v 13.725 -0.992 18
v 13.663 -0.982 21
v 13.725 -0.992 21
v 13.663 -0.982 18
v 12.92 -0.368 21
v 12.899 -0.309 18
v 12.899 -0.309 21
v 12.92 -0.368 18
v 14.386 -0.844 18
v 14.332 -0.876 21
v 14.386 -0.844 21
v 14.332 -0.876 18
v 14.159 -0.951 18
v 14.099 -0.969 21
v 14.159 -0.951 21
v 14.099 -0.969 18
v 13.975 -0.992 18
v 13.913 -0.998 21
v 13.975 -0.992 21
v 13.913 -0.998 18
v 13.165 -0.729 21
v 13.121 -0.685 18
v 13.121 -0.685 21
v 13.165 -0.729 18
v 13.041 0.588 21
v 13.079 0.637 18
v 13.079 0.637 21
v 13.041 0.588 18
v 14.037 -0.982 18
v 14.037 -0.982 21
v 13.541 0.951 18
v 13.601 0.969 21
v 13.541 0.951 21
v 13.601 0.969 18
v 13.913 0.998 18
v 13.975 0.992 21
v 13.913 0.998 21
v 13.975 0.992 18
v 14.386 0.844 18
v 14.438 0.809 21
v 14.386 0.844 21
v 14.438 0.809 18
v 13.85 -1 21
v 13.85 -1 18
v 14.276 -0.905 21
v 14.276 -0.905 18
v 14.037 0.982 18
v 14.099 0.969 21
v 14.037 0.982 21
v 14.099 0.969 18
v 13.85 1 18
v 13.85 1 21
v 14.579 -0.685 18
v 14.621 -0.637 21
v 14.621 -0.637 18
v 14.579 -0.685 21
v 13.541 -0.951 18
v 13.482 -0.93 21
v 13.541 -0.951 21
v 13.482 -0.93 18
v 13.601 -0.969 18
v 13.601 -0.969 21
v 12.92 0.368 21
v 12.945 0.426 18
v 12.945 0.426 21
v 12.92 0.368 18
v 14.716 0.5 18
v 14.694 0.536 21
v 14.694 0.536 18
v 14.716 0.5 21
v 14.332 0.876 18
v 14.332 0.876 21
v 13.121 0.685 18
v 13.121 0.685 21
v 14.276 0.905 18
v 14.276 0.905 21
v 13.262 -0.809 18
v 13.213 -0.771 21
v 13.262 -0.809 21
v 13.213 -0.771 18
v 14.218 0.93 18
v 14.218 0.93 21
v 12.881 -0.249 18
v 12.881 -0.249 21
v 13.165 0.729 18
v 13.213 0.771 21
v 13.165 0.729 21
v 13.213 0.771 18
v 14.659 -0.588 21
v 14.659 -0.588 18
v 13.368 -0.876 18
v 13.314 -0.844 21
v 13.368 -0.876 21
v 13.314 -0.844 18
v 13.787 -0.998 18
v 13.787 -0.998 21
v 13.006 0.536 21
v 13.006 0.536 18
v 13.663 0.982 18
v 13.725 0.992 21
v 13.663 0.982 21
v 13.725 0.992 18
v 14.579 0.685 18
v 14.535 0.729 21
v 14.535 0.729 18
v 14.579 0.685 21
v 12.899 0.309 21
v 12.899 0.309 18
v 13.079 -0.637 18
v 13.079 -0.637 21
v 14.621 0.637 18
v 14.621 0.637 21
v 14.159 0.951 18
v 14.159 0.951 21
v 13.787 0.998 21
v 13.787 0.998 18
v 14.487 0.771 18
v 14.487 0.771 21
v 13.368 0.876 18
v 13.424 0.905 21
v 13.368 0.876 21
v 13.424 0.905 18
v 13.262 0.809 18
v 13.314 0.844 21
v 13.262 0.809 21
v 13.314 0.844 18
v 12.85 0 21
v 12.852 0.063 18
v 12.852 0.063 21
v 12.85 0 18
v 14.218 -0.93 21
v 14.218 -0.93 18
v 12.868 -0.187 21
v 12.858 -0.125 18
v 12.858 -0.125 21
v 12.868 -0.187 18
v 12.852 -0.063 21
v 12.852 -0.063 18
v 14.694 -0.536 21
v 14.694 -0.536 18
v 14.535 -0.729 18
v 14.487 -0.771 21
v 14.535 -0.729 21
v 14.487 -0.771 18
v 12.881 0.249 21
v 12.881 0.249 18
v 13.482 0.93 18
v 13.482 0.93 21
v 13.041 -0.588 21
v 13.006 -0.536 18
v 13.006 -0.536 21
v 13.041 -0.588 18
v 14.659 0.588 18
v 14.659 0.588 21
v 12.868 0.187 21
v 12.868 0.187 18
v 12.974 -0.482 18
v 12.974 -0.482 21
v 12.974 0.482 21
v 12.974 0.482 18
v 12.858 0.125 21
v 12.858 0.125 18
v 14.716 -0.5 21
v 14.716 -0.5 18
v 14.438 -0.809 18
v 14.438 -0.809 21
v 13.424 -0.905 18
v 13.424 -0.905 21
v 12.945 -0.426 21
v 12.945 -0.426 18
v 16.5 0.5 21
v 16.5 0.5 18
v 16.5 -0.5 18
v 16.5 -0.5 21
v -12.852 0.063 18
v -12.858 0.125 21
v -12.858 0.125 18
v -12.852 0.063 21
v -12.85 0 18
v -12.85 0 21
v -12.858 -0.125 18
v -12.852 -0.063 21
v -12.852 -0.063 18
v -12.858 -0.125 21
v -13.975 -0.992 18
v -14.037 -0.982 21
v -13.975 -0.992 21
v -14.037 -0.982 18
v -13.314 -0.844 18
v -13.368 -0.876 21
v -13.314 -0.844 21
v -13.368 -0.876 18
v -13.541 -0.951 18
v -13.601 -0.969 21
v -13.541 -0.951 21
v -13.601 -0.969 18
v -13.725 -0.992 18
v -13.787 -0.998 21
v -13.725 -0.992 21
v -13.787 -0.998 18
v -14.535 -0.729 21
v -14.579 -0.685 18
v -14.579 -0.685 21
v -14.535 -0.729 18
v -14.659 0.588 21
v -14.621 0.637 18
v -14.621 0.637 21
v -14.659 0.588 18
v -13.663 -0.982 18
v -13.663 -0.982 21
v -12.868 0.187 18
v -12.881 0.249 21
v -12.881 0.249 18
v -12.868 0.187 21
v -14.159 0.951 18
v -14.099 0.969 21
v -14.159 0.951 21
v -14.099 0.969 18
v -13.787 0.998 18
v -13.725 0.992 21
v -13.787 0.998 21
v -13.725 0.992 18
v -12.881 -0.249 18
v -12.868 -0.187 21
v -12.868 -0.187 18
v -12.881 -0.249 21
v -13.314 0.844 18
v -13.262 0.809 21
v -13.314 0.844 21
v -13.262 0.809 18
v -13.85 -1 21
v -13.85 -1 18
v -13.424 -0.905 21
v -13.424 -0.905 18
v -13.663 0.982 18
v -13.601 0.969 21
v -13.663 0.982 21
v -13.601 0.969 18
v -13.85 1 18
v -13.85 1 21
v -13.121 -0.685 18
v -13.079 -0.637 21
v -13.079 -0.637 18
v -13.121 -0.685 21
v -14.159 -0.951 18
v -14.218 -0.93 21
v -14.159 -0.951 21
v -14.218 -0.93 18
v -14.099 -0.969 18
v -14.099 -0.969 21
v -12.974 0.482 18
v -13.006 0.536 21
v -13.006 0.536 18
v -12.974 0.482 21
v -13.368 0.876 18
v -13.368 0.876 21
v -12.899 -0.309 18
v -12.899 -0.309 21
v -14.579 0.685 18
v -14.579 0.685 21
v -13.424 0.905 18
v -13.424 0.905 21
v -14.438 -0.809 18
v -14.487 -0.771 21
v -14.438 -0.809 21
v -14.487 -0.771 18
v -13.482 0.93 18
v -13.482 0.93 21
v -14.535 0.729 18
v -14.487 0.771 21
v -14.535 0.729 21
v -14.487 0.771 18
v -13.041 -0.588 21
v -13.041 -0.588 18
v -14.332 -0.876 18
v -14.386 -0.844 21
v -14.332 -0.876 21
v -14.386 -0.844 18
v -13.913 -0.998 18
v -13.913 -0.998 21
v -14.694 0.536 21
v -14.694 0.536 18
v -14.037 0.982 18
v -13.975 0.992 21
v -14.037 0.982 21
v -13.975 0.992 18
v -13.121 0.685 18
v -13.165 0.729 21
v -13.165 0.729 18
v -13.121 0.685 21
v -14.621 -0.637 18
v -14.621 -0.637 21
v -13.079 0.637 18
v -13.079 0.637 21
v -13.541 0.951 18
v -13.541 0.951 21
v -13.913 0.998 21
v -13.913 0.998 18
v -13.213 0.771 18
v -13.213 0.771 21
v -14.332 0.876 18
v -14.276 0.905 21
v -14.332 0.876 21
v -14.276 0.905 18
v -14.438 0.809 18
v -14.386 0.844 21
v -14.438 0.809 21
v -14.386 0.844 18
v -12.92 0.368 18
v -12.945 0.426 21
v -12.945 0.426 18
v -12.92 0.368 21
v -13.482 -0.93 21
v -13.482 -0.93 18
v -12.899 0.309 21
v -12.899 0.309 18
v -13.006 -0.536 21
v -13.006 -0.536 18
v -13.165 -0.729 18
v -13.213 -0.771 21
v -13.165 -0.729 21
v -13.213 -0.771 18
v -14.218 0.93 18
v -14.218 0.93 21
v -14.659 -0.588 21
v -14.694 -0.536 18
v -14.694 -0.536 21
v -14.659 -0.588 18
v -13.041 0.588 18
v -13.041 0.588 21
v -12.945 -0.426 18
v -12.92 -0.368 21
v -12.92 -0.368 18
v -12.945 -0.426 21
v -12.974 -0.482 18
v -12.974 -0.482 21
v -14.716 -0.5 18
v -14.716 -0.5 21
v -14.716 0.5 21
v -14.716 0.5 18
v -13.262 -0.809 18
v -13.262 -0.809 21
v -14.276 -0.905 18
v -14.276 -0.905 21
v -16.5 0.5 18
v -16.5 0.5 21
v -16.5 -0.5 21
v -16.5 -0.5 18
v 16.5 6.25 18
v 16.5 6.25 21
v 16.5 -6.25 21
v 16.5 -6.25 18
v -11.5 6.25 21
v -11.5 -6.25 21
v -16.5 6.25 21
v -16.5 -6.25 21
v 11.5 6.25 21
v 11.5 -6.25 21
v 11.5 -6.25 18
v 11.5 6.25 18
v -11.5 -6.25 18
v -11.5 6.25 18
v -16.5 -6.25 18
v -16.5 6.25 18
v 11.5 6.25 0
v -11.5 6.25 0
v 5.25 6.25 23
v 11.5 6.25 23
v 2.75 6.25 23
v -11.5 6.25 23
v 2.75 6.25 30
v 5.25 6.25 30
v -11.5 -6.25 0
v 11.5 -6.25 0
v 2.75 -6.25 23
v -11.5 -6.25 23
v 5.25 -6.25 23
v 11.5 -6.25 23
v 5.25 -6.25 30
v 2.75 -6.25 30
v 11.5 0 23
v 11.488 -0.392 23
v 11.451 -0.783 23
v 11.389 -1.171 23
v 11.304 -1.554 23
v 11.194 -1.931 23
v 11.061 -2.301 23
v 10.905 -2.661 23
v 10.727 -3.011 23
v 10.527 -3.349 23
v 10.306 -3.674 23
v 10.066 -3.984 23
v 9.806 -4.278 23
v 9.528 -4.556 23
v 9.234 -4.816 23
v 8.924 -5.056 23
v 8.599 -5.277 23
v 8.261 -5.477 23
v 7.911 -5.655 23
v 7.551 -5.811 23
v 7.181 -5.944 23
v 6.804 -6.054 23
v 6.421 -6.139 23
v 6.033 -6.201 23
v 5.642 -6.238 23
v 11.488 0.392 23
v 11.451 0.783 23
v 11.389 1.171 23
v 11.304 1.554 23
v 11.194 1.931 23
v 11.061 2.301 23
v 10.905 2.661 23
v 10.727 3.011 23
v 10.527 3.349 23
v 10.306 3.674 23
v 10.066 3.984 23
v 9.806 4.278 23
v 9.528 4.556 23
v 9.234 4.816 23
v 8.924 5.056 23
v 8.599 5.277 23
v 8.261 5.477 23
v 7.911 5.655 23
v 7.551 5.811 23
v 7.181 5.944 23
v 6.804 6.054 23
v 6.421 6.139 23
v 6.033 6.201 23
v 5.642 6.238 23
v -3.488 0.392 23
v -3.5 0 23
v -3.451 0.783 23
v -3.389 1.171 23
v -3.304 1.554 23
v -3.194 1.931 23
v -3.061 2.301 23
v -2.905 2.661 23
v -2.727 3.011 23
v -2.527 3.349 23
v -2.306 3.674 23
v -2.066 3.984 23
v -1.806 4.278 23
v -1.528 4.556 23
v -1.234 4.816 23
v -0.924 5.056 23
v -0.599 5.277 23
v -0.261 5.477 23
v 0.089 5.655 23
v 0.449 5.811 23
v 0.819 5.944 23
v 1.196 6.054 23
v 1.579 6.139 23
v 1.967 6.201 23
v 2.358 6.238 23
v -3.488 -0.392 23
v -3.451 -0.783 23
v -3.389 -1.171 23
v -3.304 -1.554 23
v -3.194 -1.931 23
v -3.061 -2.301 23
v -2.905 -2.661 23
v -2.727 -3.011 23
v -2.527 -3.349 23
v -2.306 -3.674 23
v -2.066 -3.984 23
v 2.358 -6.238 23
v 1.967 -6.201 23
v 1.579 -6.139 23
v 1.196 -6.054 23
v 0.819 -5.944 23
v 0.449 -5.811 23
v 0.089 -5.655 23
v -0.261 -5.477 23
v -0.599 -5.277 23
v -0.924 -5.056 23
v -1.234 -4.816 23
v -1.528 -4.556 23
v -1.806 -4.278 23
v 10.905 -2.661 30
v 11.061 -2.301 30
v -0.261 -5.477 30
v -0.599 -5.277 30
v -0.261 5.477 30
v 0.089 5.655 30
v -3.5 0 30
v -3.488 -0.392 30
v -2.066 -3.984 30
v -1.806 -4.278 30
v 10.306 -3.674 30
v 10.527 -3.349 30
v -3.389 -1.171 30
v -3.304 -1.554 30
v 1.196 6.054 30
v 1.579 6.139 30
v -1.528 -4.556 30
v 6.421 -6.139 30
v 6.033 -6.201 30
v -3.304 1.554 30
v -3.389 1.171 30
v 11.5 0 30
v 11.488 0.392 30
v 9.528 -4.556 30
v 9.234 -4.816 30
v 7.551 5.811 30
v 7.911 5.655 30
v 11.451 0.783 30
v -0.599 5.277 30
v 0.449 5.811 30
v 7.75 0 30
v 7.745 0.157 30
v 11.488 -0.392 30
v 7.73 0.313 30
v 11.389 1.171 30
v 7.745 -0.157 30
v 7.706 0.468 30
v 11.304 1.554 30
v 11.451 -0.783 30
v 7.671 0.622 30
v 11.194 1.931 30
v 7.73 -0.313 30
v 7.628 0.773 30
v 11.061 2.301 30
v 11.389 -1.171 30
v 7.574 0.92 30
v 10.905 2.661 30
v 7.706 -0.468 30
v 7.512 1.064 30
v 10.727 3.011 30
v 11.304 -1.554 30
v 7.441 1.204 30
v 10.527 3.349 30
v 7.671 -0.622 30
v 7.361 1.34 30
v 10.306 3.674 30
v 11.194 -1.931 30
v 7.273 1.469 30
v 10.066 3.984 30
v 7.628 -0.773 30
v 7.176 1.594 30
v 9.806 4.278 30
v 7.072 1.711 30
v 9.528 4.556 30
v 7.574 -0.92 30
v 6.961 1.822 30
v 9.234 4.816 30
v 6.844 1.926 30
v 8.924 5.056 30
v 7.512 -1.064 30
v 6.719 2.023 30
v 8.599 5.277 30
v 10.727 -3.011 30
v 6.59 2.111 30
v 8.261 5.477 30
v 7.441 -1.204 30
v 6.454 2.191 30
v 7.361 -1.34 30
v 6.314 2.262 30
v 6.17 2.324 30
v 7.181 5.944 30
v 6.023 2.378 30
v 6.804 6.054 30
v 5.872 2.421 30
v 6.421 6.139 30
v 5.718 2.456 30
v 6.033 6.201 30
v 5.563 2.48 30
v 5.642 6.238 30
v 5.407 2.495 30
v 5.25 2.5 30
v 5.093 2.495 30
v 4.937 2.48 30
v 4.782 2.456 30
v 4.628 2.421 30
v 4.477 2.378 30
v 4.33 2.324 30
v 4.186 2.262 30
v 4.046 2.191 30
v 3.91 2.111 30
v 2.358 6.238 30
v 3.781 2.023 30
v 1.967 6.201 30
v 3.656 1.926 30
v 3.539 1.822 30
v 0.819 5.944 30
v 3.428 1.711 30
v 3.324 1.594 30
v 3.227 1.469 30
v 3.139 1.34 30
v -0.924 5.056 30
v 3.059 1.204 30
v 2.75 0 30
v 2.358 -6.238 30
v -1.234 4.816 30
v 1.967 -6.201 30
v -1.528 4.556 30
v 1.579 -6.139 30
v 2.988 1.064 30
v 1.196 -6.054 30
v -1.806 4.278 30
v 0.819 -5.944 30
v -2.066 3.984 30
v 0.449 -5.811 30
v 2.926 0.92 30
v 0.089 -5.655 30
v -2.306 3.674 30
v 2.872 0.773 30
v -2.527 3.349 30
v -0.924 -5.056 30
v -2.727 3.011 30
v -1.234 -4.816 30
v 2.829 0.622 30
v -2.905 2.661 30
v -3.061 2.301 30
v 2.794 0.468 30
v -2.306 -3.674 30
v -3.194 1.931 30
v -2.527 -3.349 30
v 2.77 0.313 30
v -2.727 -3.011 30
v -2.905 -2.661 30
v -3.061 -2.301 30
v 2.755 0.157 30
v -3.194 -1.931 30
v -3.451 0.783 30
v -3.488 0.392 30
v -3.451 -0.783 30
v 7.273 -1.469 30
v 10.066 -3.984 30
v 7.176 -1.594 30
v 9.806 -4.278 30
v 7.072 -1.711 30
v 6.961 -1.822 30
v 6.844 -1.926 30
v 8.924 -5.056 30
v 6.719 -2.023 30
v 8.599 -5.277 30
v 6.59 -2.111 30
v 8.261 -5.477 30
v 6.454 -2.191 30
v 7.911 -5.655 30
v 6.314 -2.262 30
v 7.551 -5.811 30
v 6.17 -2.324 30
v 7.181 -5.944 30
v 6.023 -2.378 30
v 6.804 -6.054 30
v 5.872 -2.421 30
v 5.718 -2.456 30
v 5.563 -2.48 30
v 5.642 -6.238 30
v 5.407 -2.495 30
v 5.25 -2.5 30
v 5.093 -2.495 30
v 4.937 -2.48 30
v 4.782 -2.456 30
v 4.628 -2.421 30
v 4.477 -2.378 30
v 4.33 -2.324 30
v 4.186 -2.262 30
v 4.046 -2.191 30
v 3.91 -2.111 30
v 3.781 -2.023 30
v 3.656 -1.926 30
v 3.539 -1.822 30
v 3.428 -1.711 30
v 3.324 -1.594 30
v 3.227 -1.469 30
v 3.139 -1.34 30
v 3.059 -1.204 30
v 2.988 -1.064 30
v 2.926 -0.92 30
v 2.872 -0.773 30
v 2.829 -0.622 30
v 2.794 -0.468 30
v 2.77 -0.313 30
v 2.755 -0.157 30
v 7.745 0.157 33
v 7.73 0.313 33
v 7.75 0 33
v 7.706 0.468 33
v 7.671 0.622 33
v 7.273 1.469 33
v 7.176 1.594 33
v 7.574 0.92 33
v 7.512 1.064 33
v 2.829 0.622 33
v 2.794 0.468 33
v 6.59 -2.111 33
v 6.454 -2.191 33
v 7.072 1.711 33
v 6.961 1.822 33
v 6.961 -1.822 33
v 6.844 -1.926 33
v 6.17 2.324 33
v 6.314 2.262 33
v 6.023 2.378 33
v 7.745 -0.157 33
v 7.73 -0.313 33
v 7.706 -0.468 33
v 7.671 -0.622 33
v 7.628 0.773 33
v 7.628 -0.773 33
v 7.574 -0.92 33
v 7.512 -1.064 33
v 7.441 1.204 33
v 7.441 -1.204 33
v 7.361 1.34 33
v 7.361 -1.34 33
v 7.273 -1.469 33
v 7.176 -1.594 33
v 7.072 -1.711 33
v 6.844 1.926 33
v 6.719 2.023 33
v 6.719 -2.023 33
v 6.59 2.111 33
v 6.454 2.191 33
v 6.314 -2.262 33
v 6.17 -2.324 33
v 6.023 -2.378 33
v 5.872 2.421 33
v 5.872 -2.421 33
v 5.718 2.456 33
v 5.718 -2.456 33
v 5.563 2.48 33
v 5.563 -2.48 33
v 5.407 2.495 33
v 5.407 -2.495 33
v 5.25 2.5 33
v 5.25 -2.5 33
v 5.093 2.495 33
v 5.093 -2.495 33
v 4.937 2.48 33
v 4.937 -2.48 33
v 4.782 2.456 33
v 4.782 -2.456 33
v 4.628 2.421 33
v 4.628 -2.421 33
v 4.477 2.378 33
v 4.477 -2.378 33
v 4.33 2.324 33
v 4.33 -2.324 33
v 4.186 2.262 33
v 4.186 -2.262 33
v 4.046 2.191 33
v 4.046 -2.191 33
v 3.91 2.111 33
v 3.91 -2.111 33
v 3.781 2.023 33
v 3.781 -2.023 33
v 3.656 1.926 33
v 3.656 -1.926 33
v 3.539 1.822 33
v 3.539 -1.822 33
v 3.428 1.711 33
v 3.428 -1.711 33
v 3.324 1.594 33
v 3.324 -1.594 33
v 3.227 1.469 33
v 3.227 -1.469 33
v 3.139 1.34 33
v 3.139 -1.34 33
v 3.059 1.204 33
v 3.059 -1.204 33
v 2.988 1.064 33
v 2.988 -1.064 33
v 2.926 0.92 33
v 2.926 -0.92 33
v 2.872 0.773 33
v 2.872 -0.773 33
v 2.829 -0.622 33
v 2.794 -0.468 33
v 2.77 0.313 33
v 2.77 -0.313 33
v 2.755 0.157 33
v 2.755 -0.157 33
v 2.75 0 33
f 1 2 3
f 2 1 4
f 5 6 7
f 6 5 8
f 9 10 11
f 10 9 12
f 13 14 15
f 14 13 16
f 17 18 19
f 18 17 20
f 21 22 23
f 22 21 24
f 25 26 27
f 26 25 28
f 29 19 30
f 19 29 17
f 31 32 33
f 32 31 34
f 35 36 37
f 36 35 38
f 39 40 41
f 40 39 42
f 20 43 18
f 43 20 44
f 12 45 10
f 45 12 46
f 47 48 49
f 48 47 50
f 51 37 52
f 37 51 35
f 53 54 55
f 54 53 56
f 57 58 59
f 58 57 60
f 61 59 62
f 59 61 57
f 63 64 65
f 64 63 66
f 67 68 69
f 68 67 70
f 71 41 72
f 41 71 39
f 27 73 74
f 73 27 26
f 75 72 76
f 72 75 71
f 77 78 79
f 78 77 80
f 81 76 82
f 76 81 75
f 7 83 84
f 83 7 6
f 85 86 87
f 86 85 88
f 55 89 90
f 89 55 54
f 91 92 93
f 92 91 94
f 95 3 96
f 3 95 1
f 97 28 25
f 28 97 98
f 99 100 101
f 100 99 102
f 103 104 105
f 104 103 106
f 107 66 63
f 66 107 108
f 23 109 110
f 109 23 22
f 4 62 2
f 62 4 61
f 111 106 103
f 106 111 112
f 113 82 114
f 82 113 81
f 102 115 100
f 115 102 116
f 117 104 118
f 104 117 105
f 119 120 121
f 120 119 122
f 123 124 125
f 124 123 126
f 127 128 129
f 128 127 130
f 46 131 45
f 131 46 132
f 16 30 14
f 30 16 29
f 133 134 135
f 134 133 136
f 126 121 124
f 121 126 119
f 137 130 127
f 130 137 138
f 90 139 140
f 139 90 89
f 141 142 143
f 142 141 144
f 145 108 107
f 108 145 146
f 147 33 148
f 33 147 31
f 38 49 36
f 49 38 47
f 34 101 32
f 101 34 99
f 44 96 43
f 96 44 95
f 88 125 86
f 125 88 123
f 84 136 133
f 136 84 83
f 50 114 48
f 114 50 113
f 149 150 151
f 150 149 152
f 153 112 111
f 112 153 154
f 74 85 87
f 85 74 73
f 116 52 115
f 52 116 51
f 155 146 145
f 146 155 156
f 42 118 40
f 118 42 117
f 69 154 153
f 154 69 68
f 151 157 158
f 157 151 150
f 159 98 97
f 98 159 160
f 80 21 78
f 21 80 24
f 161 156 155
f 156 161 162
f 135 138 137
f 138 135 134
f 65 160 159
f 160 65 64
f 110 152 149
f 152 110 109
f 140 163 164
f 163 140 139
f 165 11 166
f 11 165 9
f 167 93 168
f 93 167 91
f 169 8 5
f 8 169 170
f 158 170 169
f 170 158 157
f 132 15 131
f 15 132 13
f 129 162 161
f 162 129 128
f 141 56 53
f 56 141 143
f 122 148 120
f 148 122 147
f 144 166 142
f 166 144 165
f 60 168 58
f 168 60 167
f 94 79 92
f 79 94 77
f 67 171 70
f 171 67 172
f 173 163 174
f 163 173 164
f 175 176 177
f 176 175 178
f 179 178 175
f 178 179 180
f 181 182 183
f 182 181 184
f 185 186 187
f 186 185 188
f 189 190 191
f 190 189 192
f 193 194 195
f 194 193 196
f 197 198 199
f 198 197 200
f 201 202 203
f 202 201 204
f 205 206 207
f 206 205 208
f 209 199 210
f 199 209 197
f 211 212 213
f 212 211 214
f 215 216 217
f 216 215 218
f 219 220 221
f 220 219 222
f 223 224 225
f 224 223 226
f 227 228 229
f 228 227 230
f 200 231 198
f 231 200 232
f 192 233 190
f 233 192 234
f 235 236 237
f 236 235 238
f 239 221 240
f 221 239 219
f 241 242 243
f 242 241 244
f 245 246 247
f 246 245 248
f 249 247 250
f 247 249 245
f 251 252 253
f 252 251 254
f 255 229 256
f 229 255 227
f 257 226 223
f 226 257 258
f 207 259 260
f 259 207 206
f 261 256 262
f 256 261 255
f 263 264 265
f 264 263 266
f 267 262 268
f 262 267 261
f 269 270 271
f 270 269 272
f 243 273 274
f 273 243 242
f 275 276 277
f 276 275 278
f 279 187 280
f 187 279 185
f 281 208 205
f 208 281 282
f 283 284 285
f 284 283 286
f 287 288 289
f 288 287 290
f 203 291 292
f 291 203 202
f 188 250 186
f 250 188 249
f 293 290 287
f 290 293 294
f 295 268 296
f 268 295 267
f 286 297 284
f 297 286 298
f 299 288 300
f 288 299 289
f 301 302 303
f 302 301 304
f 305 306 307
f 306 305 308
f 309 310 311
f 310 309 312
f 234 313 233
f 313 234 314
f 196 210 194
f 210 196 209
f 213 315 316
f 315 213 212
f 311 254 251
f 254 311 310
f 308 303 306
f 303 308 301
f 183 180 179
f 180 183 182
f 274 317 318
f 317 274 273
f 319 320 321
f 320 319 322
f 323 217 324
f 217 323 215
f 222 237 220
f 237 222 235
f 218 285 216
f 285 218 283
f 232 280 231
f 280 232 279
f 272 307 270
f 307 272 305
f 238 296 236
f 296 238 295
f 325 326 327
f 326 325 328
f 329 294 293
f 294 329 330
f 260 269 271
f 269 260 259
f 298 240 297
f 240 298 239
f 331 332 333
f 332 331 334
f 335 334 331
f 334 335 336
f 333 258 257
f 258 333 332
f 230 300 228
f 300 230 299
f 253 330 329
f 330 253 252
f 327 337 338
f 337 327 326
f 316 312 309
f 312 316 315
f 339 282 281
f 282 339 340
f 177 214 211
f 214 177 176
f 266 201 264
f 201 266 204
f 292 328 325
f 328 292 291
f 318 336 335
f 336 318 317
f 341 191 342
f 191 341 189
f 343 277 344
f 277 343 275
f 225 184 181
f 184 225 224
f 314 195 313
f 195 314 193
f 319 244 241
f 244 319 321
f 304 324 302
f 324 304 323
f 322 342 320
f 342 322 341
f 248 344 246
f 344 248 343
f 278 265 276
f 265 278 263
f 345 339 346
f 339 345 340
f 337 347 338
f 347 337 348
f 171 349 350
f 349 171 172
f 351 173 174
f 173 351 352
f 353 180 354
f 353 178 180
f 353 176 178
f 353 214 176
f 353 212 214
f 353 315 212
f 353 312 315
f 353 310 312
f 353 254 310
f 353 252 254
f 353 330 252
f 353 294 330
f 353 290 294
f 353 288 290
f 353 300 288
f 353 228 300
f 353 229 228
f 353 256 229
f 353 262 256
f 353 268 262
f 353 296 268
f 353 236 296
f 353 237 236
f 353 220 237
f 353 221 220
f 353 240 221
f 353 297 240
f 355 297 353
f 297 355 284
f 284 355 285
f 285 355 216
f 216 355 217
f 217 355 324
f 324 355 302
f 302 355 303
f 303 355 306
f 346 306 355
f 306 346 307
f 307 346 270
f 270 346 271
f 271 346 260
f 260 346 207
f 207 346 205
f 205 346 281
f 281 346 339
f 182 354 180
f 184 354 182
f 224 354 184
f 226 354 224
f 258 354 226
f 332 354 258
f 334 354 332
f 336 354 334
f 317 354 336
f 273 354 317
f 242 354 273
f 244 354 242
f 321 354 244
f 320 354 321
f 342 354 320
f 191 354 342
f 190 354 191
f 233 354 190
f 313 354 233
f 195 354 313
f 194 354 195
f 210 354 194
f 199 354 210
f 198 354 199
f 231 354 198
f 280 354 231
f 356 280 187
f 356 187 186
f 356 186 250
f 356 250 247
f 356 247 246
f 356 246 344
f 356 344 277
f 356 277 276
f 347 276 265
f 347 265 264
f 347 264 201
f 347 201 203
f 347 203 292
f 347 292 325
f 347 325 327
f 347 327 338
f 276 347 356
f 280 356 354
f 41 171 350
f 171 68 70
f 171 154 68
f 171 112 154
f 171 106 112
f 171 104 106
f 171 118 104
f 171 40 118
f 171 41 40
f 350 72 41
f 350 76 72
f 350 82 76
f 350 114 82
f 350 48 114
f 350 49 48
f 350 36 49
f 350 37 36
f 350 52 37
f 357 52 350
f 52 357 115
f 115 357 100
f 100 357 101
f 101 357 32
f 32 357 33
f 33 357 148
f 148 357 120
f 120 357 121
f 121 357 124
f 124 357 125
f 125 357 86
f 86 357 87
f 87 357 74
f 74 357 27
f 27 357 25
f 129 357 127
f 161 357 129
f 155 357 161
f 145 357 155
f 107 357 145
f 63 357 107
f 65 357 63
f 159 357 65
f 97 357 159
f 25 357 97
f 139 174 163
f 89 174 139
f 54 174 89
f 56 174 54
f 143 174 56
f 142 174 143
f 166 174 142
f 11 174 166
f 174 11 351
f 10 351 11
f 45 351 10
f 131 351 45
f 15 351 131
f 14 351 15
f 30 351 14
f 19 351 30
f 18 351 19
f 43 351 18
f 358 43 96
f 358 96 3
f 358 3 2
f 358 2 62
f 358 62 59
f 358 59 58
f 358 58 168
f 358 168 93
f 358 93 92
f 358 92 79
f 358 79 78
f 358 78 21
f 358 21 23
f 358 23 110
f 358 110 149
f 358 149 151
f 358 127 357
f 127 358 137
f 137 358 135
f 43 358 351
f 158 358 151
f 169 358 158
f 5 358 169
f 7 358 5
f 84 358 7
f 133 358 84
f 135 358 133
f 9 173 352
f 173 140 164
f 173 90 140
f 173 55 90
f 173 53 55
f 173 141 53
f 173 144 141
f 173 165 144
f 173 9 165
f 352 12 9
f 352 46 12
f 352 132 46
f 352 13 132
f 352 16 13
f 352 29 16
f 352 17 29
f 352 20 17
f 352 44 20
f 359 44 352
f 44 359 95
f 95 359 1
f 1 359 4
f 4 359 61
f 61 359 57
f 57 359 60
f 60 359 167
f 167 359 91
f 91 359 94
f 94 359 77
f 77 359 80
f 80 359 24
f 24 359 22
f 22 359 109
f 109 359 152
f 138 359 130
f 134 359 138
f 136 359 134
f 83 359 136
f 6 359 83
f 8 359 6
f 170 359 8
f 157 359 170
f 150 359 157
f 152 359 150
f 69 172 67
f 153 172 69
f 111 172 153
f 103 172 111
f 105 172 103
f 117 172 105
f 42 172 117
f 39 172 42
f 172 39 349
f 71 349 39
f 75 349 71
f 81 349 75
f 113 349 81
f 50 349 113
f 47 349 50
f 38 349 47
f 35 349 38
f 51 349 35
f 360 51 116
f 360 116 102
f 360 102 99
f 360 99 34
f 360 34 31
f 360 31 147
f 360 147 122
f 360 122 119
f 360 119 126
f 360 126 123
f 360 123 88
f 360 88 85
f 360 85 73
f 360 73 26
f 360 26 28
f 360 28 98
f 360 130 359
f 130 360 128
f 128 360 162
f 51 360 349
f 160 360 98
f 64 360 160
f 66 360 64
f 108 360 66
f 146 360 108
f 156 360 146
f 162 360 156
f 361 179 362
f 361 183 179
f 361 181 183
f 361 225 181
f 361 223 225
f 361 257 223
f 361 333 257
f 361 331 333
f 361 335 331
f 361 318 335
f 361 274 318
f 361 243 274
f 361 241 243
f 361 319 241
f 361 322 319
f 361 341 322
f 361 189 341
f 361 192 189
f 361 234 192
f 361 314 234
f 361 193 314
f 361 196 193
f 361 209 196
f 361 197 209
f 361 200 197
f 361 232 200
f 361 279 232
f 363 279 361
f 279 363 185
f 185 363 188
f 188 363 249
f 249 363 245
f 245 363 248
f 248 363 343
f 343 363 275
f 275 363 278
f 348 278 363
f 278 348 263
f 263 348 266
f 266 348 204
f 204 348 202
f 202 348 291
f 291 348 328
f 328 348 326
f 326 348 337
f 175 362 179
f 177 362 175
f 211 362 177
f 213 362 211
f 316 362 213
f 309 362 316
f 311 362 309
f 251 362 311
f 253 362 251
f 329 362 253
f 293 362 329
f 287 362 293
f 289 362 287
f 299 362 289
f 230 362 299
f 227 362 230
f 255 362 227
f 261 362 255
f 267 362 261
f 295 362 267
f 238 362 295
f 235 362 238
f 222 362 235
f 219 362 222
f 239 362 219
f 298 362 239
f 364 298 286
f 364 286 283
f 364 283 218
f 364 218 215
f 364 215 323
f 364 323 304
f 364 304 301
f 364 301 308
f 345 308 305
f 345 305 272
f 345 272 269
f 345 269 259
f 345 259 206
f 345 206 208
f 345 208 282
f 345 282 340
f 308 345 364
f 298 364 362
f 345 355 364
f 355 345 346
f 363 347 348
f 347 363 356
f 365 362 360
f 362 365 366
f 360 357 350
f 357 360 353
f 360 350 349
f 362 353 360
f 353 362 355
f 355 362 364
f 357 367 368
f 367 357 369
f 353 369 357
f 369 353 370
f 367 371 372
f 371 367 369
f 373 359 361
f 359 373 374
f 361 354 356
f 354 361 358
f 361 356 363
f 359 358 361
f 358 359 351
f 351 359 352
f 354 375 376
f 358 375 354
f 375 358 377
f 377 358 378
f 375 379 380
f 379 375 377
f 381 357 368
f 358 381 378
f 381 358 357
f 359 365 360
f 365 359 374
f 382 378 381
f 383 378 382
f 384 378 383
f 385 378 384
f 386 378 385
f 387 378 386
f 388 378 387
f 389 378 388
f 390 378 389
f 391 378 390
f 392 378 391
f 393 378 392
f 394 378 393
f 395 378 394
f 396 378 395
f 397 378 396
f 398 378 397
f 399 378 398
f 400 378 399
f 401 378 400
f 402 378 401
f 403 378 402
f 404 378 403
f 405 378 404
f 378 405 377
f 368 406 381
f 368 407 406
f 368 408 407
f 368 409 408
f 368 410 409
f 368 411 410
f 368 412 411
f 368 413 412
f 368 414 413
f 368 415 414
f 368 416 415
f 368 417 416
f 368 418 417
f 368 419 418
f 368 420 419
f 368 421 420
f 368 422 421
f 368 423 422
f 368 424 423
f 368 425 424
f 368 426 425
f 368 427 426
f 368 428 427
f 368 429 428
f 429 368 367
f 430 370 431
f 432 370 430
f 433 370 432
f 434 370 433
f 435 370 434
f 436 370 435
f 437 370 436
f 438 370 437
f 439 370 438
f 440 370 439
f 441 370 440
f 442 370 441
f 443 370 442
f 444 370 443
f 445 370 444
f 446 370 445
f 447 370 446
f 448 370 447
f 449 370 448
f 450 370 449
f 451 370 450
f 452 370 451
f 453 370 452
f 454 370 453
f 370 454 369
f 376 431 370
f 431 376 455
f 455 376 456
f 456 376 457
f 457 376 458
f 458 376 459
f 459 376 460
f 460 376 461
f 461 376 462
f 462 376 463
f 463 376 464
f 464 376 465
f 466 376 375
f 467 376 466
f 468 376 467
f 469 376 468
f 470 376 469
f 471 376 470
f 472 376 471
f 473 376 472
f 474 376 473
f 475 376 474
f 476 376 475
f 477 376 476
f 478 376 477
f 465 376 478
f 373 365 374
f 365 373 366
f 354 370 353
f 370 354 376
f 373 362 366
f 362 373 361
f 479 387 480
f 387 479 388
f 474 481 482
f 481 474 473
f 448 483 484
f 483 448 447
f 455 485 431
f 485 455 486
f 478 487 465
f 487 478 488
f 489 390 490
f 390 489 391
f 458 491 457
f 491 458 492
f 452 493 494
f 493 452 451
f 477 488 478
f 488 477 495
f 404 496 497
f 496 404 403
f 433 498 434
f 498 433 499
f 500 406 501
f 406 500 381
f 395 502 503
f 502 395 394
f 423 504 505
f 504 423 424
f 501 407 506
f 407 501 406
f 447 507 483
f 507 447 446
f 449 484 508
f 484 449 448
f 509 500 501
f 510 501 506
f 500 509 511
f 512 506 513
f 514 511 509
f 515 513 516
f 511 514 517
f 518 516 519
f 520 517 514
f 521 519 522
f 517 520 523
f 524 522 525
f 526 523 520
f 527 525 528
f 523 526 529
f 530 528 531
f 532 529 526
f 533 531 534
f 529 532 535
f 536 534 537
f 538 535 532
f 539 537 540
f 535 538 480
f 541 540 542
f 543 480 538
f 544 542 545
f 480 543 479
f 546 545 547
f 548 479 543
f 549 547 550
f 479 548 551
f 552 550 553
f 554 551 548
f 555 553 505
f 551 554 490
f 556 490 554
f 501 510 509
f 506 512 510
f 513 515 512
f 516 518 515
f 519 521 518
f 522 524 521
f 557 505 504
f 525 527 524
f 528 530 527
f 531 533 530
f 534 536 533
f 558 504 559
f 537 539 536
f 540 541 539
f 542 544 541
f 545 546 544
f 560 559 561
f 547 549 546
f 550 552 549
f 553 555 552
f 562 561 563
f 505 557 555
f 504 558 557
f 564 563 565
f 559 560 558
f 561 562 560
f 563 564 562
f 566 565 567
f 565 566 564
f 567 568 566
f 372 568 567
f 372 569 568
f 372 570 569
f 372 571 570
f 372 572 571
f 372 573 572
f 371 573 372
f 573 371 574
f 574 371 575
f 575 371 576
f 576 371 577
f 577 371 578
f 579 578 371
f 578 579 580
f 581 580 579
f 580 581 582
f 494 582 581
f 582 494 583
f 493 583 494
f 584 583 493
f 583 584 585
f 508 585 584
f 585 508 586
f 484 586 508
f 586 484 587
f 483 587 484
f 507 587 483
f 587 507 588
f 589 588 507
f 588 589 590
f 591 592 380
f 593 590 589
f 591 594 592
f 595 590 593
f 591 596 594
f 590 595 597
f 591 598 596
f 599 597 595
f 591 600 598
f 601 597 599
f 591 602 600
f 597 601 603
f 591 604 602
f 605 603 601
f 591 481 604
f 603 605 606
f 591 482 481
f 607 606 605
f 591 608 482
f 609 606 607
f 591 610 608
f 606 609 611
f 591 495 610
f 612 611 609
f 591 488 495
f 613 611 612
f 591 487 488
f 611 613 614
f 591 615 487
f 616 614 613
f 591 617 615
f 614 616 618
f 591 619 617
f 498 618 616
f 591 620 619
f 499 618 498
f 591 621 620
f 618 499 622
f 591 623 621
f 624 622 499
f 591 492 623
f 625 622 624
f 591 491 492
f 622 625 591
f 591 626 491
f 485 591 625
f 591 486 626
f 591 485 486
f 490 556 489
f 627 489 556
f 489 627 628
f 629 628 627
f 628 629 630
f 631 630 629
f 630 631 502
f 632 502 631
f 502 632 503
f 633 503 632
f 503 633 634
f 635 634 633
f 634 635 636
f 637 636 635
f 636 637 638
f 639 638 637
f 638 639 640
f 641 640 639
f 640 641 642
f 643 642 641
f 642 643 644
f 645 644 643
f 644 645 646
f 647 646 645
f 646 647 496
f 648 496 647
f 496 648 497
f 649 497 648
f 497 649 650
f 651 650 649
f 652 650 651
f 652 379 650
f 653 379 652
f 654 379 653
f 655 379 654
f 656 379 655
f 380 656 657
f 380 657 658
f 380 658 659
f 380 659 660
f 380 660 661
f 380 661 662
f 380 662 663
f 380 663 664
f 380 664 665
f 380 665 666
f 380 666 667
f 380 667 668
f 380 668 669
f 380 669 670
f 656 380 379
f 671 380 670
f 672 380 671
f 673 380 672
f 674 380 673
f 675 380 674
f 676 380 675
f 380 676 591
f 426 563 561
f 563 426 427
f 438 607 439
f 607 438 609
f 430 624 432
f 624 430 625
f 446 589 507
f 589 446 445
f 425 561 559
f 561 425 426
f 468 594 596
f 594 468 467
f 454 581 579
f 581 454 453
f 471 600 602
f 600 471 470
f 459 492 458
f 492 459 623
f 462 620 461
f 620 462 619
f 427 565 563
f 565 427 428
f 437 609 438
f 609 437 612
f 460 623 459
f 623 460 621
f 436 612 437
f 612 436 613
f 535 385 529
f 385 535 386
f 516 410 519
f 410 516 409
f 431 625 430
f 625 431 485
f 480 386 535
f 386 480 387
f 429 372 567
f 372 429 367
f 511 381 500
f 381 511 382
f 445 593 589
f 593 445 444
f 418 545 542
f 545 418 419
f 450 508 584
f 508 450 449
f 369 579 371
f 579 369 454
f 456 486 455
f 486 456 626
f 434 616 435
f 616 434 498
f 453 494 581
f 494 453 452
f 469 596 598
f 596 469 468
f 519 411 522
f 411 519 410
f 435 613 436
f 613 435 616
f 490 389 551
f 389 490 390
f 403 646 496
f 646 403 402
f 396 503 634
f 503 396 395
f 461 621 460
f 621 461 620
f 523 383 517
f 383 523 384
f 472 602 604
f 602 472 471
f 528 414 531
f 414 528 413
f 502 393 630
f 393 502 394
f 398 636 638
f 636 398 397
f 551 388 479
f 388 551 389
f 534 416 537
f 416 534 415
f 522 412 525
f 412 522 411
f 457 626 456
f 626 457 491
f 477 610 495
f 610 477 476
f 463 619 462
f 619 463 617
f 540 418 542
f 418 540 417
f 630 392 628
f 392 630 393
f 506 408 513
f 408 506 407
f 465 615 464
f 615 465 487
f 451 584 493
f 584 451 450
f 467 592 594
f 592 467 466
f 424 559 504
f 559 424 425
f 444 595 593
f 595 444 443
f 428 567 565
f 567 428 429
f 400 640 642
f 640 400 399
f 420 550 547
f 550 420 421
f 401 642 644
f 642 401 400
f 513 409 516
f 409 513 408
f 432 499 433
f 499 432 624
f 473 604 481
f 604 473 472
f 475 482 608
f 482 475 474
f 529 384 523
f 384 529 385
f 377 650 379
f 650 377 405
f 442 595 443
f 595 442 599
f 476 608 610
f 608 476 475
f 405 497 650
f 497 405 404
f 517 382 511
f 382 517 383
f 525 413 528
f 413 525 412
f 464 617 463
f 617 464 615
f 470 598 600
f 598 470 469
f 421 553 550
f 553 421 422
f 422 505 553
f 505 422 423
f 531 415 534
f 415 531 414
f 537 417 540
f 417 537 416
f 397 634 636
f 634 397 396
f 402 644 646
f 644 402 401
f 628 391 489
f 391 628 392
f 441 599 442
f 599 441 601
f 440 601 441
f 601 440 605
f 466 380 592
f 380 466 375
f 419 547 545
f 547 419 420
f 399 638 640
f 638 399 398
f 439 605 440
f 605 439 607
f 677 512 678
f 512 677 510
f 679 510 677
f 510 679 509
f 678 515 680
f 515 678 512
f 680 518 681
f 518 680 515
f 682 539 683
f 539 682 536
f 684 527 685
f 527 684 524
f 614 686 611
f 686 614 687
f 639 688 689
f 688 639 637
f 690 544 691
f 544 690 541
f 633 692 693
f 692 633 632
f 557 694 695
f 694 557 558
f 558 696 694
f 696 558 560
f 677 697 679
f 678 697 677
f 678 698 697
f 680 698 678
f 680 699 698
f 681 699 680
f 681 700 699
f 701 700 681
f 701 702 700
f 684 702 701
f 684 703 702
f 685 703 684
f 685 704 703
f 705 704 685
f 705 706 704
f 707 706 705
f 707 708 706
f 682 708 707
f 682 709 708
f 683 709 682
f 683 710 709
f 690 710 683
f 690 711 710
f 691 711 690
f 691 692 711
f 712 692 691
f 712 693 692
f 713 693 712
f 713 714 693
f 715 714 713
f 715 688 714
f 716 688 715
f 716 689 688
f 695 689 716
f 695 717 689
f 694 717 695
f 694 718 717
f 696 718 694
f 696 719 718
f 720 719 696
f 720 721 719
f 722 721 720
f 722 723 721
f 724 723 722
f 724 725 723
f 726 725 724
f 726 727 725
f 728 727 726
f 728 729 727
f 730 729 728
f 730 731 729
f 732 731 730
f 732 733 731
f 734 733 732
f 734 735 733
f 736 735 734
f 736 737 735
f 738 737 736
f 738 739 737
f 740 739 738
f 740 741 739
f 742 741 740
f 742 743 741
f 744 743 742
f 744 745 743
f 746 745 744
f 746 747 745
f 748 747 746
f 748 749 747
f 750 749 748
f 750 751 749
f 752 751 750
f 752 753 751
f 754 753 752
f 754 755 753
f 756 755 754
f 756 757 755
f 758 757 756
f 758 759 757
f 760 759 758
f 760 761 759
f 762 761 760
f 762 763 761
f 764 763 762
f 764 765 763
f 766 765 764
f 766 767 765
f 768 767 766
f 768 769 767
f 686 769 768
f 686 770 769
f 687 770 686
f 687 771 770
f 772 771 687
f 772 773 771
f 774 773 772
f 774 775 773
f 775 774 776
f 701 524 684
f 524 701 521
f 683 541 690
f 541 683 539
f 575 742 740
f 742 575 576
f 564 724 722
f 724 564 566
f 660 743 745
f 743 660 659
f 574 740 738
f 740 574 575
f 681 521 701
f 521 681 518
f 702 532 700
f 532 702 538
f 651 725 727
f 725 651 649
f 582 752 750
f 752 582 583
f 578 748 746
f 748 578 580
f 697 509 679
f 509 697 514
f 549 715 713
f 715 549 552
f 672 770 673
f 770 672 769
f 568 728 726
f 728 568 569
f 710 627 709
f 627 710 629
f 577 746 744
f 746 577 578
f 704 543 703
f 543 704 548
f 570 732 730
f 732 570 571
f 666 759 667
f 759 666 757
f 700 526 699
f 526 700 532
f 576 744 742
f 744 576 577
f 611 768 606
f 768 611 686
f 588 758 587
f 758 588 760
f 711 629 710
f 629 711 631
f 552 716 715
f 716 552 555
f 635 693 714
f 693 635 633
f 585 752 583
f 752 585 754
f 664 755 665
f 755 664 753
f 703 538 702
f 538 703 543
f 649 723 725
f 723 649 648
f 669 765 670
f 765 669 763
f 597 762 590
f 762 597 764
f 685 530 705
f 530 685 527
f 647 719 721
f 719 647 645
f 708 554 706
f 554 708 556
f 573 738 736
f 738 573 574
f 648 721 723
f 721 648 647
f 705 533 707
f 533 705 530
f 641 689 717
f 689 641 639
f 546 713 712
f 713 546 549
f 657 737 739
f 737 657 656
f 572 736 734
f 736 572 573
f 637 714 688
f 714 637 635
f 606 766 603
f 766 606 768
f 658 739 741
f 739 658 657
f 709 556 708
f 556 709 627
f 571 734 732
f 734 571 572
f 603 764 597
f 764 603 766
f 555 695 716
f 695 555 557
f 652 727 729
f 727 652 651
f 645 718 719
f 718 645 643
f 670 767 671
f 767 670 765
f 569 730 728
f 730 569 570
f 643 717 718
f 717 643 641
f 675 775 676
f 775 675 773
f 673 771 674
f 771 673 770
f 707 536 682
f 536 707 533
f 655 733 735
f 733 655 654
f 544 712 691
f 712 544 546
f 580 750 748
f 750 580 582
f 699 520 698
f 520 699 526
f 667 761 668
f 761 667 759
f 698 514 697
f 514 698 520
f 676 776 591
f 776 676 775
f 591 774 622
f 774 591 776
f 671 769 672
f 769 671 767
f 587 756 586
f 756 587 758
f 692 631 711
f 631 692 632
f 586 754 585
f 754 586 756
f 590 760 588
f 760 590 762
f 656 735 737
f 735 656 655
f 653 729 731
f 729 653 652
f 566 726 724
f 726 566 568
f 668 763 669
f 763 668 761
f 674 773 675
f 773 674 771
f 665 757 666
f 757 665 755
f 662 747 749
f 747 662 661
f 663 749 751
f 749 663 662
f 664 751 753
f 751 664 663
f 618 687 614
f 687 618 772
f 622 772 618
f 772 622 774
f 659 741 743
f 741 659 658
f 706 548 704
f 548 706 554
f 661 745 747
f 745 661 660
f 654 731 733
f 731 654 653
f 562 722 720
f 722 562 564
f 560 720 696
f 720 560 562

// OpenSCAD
$fn = 100;

/* Micro Servo MG90S Dimensions:
    > total_height: 33mm
    > base_width: 22mm
    > base_depth: 12.5mm 
    > base_height: 22mm
    > bottom_to_wing: 18mm
    > wing_thickness: 2mm
    > wing_span: 31.8mm
    > wing_screw_dist: 27.7mm 
    > plinth_width: 14.5mm 
    > plinth_depth: 12.5mm
    > plinth_height: 10mm
    > spline_height: 3mm
*/

total_height = 33;
base_width = 23; //Measured
base_depth = 12.5;
base_height = 23; //Measured
bottom_to_wing = 18;
wing_thickness = 3; //Measured 
wing_span = 33; //Measured
wing_screw_dist = 27.7;
screw_d = 2;
plinth_width = 15;
plinth_depth = 12.5;
plinth_height = 7;
spline_height = 3;

function mg90s_micro_servo_info() = [
    33,     //total_height
    23,     //base_width
    12.5,   //base_depth
    23,     //base_height
    18,     //bottom_to_wing
    3,      //wing_thickness
    33,     //wing_span
    27.7,   //wing_screw_dist
    2,      //screw_d
    15,     //plinth_width
    12.5,   //plinth_depth
    7,     //plinth_height
    3       //spline_height
];

module mg90s_micro_servo() {
    // Base
    translate([0, 0, base_height / 2])
        cube([base_width, base_depth, base_height], center = true);

    // Wing
    translate([0, 0, bottom_to_wing + wing_thickness / 2])
        difference() {
            cube([wing_span, base_depth, wing_thickness], center = true);
            
            translate([wing_screw_dist / 2, 0, 0])
                union() {
                    cylinder(d = screw_d, h = 20, center = true);
                    translate([screw_d, 0, 0]) 
                        cube([2.5, 1, wing_thickness + 1], center = true);
                }
            translate([-wing_screw_dist / 2, 0, 0])
                union() {
                    cylinder(d = screw_d, h = 20, center = true);
                    translate([-screw_d, 0, 0])
                        cube([2.5, 1, wing_thickness + 1], center = true);
                }
        }

    // Plinth
    translate([(base_width - plinth_width) / 2, 0, plinth_height / 2 + base_height])
        hull() {
            translate([(plinth_width - plinth_depth) / 2, 0, 0])
                cylinder(d = plinth_depth, h = plinth_height, center = true);
            translate([-(plinth_width - plinth_depth) / 2, 0, 0])
                cylinder(d = plinth_depth, h = plinth_height, center = true);
        }

    // Spline
    translate([
        (base_width - plinth_depth) / 2,
        0, 
        plinth_height + base_height + spline_height / 2
    ])
        cylinder(d = 5, h = spline_height, center = true);
}

/* Mask includes: 
    > Wings
    > Screw holes
*/
module mg90s_micro_servo_mask() {
    difference() {
        cube([wing_span, base_depth, wing_thickness], center = true);
        cube([base_width, base_depth + 1, wing_thickness + 1], center = true);
    }

    translate([-wing_screw_dist / 2, 0, 0])
        hull() {
            translate([0, 1, 0])
                cylinder(d = screw_d, h = 20, center = true);
            translate([0, -1, 0])
                cylinder(d = screw_d, h = 20, center = true);    
        }
    
    translate([wing_screw_dist / 2, 0, 0])
        hull() {
            translate([0, 1, 0])
                cylinder(d = screw_d, h = 20, center = true);
            translate([0, -1, 0])
                cylinder(d = screw_d, h = 20, center = true);    
        }
}

mg90s_micro_servo();
*mg90s_micro_servo_mask();
